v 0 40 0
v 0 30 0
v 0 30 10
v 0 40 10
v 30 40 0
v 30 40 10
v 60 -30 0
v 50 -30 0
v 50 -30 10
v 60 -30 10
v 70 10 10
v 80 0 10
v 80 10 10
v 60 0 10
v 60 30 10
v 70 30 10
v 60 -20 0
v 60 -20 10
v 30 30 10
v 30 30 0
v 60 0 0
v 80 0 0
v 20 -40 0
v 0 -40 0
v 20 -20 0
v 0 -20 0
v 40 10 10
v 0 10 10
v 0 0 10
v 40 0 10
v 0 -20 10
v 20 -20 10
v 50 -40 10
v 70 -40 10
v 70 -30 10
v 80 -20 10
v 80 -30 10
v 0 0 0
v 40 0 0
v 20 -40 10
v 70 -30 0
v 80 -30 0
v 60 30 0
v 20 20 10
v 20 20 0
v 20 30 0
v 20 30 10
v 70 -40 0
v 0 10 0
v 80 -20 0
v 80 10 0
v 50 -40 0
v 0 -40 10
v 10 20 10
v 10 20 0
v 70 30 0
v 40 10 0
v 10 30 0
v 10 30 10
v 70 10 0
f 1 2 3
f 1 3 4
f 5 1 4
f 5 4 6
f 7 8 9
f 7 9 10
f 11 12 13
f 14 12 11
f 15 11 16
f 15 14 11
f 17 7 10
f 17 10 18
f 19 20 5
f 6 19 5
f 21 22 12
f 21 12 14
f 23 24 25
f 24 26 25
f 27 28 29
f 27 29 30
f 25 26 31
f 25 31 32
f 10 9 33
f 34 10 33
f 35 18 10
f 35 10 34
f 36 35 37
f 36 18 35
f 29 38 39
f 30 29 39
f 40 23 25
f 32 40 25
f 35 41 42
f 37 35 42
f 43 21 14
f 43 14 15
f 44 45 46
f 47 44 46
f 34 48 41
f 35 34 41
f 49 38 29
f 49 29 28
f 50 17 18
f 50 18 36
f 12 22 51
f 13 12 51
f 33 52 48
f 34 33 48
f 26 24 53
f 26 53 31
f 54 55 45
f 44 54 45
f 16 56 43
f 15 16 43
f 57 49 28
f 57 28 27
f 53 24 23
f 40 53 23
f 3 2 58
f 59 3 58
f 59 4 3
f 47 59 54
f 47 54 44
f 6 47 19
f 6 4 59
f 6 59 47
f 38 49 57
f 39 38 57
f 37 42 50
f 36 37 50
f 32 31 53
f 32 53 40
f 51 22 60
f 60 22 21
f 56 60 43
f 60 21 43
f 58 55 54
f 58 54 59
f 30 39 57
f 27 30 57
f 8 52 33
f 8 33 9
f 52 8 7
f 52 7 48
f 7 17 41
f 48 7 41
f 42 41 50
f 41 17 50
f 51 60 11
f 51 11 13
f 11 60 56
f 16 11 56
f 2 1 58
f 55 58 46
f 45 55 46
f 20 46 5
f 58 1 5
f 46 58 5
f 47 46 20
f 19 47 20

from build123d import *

# Parameters (mm, degrees)
BOX_W        = 40
BOX_H        = 10
BOX_DEPTH    = 10
BOX001_W     = 30
BOX001_H     = 10
BOX001_DEPTH = 10
BOX002_W     = 10
BOX002_H     = 10
BOX002_DEPTH = 10
BOX003_W     = 10
BOX003_H     = 10
BOX003_DEPTH = 10
BOX004_W     = 10
BOX004_H     = 10
BOX004_DEPTH = 10
BOX005_W     = 10
BOX005_H     = 10
BOX005_DEPTH = 10
BOX006_W     = 10
BOX006_H     = 10
BOX006_DEPTH = 10
BOX007_W     = 30
BOX007_H     = 10
BOX007_DEPTH = 10
BOX008_W     = 10
BOX008_H     = 10
BOX008_DEPTH = 10
BOX009_W     = 10
BOX009_H     = 10
BOX009_DEPTH = 10
BOX010_W     = 10
BOX010_H     = 10
BOX010_DEPTH = 10
BOX011_W     = 10
BOX011_H     = 10
BOX011_DEPTH = 10
BOX012_W     = 10
BOX012_H     = 10
BOX012_DEPTH = 10


with BuildPart() as cub:
    # Box → Box (new body)
    with BuildSketch(Plane.XY):
        with Locations((20, 5)):
            Rectangle(BOX_W, BOX_H)
    extrude(amount=BOX_DEPTH)


with BuildPart() as cub001:
    # Box001 → Box001 (new body)
    with BuildSketch(Plane(origin=(0, 30, 0), x_dir=(1, 0, 0), z_dir=(0, 0, 1))):
        with Locations((15, 5)):
            Rectangle(BOX001_W, BOX001_H)
    extrude(amount=BOX001_DEPTH)


with BuildPart() as fusion:
    # Box002 → Box002 (new body)
    with BuildSketch(Plane(origin=(10, 20, 0), x_dir=(1, 0, 0), z_dir=(0, 0, 1))):
        with Locations((5, 5)):
            Rectangle(BOX002_W, BOX002_H)
    extrude(amount=BOX002_DEPTH)

    # Fusion: union Cub001
    add(cub001.part)


with BuildPart() as cub003:
    # Box003 → Box003 (new body)
    with BuildSketch(Plane(origin=(0, -30, 0), x_dir=(1, 0, 0), z_dir=(0, 0, 1))):
        with Locations((5, 5)):
            Rectangle(BOX003_W, BOX003_H)
    extrude(amount=BOX003_DEPTH)


with BuildPart() as cub004:
    # Box004 → Box004 (new body)
    with BuildSketch(Plane(origin=(10, -30, 0), x_dir=(1, 0, 0), z_dir=(0, 0, 1))):
        with Locations((5, 5)):
            Rectangle(BOX004_W, BOX004_H)
    extrude(amount=BOX004_DEPTH)


with BuildPart() as cub005:
    # Box005 → Box005 (new body)
    with BuildSketch(Plane(origin=(0, -40, 0), x_dir=(1, 0, 0), z_dir=(0, 0, 1))):
        with Locations((5, 5)):
            Rectangle(BOX005_W, BOX005_H)
    extrude(amount=BOX005_DEPTH)


with BuildPart() as fusion001:
    # Box006 → Box006 (new body)
    with BuildSketch(Plane(origin=(10, -40, 0), x_dir=(1, 0, 0), z_dir=(0, 0, 1))):
        with Locations((5, 5)):
            Rectangle(BOX006_W, BOX006_H)
    extrude(amount=BOX006_DEPTH)

    # Fusion001: union Cub003, Cub004, Cub005
    add(cub003.part)
    add(cub004.part)
    add(cub005.part)


with BuildPart() as cub007:
    # Box007 → Box007 (new body)
    with BuildSketch(Plane(origin=(70, 0, 0), x_dir=(0, 1, 0), z_dir=(0, 0, 1))):
        with Locations((15, 5)):
            Rectangle(BOX007_W, BOX007_H)
    extrude(amount=BOX007_DEPTH)


with BuildPart() as fusion002:
    # Box008 → Box008 (new body)
    with BuildSketch(Plane(origin=(70, 0, 0), x_dir=(1, 0, 0), z_dir=(0, 0, 1))):
        with Locations((5, 5)):
            Rectangle(BOX008_W, BOX008_H)
    extrude(amount=BOX008_DEPTH)

    # Fusion002: union Cub007
    add(cub007.part)


with BuildPart() as cub009:
    # Box009 → Box009 (new body)
    with BuildSketch(Plane(origin=(50, -40, 0), x_dir=(1, 0, 0), z_dir=(0, 0, 1))):
        with Locations((5, 5)):
            Rectangle(BOX009_W, BOX009_H)
    extrude(amount=BOX009_DEPTH)


with BuildPart() as cub010:
    # Box010 → Box010 (new body)
    with BuildSketch(Plane(origin=(60, -40, 0), x_dir=(1, 0, 0), z_dir=(0, 0, 1))):
        with Locations((5, 5)):
            Rectangle(BOX010_W, BOX010_H)
    extrude(amount=BOX010_DEPTH)


with BuildPart() as cub011:
    # Box011 → Box011 (new body)
    with BuildSketch(Plane(origin=(60, -30, 0), x_dir=(1, 0, 0), z_dir=(0, 0, 1))):
        with Locations((5, 5)):
            Rectangle(BOX011_W, BOX011_H)
    extrude(amount=BOX011_DEPTH)


with BuildPart() as fusion003:
    # Box012 → Box012 (new body)
    with BuildSketch(Plane(origin=(70, -30, 0), x_dir=(1, 0, 0), z_dir=(0, 0, 1))):
        with Locations((5, 5)):
            Rectangle(BOX012_W, BOX012_H)
    extrude(amount=BOX012_DEPTH)

    # Fusion003: union Cub009, Cub010, Cub011
    add(cub009.part)
    add(cub010.part)
    add(cub011.part)


solid = Compound([cub.part, fusion.part, fusion001.part, fusion002.part, fusion003.part])
